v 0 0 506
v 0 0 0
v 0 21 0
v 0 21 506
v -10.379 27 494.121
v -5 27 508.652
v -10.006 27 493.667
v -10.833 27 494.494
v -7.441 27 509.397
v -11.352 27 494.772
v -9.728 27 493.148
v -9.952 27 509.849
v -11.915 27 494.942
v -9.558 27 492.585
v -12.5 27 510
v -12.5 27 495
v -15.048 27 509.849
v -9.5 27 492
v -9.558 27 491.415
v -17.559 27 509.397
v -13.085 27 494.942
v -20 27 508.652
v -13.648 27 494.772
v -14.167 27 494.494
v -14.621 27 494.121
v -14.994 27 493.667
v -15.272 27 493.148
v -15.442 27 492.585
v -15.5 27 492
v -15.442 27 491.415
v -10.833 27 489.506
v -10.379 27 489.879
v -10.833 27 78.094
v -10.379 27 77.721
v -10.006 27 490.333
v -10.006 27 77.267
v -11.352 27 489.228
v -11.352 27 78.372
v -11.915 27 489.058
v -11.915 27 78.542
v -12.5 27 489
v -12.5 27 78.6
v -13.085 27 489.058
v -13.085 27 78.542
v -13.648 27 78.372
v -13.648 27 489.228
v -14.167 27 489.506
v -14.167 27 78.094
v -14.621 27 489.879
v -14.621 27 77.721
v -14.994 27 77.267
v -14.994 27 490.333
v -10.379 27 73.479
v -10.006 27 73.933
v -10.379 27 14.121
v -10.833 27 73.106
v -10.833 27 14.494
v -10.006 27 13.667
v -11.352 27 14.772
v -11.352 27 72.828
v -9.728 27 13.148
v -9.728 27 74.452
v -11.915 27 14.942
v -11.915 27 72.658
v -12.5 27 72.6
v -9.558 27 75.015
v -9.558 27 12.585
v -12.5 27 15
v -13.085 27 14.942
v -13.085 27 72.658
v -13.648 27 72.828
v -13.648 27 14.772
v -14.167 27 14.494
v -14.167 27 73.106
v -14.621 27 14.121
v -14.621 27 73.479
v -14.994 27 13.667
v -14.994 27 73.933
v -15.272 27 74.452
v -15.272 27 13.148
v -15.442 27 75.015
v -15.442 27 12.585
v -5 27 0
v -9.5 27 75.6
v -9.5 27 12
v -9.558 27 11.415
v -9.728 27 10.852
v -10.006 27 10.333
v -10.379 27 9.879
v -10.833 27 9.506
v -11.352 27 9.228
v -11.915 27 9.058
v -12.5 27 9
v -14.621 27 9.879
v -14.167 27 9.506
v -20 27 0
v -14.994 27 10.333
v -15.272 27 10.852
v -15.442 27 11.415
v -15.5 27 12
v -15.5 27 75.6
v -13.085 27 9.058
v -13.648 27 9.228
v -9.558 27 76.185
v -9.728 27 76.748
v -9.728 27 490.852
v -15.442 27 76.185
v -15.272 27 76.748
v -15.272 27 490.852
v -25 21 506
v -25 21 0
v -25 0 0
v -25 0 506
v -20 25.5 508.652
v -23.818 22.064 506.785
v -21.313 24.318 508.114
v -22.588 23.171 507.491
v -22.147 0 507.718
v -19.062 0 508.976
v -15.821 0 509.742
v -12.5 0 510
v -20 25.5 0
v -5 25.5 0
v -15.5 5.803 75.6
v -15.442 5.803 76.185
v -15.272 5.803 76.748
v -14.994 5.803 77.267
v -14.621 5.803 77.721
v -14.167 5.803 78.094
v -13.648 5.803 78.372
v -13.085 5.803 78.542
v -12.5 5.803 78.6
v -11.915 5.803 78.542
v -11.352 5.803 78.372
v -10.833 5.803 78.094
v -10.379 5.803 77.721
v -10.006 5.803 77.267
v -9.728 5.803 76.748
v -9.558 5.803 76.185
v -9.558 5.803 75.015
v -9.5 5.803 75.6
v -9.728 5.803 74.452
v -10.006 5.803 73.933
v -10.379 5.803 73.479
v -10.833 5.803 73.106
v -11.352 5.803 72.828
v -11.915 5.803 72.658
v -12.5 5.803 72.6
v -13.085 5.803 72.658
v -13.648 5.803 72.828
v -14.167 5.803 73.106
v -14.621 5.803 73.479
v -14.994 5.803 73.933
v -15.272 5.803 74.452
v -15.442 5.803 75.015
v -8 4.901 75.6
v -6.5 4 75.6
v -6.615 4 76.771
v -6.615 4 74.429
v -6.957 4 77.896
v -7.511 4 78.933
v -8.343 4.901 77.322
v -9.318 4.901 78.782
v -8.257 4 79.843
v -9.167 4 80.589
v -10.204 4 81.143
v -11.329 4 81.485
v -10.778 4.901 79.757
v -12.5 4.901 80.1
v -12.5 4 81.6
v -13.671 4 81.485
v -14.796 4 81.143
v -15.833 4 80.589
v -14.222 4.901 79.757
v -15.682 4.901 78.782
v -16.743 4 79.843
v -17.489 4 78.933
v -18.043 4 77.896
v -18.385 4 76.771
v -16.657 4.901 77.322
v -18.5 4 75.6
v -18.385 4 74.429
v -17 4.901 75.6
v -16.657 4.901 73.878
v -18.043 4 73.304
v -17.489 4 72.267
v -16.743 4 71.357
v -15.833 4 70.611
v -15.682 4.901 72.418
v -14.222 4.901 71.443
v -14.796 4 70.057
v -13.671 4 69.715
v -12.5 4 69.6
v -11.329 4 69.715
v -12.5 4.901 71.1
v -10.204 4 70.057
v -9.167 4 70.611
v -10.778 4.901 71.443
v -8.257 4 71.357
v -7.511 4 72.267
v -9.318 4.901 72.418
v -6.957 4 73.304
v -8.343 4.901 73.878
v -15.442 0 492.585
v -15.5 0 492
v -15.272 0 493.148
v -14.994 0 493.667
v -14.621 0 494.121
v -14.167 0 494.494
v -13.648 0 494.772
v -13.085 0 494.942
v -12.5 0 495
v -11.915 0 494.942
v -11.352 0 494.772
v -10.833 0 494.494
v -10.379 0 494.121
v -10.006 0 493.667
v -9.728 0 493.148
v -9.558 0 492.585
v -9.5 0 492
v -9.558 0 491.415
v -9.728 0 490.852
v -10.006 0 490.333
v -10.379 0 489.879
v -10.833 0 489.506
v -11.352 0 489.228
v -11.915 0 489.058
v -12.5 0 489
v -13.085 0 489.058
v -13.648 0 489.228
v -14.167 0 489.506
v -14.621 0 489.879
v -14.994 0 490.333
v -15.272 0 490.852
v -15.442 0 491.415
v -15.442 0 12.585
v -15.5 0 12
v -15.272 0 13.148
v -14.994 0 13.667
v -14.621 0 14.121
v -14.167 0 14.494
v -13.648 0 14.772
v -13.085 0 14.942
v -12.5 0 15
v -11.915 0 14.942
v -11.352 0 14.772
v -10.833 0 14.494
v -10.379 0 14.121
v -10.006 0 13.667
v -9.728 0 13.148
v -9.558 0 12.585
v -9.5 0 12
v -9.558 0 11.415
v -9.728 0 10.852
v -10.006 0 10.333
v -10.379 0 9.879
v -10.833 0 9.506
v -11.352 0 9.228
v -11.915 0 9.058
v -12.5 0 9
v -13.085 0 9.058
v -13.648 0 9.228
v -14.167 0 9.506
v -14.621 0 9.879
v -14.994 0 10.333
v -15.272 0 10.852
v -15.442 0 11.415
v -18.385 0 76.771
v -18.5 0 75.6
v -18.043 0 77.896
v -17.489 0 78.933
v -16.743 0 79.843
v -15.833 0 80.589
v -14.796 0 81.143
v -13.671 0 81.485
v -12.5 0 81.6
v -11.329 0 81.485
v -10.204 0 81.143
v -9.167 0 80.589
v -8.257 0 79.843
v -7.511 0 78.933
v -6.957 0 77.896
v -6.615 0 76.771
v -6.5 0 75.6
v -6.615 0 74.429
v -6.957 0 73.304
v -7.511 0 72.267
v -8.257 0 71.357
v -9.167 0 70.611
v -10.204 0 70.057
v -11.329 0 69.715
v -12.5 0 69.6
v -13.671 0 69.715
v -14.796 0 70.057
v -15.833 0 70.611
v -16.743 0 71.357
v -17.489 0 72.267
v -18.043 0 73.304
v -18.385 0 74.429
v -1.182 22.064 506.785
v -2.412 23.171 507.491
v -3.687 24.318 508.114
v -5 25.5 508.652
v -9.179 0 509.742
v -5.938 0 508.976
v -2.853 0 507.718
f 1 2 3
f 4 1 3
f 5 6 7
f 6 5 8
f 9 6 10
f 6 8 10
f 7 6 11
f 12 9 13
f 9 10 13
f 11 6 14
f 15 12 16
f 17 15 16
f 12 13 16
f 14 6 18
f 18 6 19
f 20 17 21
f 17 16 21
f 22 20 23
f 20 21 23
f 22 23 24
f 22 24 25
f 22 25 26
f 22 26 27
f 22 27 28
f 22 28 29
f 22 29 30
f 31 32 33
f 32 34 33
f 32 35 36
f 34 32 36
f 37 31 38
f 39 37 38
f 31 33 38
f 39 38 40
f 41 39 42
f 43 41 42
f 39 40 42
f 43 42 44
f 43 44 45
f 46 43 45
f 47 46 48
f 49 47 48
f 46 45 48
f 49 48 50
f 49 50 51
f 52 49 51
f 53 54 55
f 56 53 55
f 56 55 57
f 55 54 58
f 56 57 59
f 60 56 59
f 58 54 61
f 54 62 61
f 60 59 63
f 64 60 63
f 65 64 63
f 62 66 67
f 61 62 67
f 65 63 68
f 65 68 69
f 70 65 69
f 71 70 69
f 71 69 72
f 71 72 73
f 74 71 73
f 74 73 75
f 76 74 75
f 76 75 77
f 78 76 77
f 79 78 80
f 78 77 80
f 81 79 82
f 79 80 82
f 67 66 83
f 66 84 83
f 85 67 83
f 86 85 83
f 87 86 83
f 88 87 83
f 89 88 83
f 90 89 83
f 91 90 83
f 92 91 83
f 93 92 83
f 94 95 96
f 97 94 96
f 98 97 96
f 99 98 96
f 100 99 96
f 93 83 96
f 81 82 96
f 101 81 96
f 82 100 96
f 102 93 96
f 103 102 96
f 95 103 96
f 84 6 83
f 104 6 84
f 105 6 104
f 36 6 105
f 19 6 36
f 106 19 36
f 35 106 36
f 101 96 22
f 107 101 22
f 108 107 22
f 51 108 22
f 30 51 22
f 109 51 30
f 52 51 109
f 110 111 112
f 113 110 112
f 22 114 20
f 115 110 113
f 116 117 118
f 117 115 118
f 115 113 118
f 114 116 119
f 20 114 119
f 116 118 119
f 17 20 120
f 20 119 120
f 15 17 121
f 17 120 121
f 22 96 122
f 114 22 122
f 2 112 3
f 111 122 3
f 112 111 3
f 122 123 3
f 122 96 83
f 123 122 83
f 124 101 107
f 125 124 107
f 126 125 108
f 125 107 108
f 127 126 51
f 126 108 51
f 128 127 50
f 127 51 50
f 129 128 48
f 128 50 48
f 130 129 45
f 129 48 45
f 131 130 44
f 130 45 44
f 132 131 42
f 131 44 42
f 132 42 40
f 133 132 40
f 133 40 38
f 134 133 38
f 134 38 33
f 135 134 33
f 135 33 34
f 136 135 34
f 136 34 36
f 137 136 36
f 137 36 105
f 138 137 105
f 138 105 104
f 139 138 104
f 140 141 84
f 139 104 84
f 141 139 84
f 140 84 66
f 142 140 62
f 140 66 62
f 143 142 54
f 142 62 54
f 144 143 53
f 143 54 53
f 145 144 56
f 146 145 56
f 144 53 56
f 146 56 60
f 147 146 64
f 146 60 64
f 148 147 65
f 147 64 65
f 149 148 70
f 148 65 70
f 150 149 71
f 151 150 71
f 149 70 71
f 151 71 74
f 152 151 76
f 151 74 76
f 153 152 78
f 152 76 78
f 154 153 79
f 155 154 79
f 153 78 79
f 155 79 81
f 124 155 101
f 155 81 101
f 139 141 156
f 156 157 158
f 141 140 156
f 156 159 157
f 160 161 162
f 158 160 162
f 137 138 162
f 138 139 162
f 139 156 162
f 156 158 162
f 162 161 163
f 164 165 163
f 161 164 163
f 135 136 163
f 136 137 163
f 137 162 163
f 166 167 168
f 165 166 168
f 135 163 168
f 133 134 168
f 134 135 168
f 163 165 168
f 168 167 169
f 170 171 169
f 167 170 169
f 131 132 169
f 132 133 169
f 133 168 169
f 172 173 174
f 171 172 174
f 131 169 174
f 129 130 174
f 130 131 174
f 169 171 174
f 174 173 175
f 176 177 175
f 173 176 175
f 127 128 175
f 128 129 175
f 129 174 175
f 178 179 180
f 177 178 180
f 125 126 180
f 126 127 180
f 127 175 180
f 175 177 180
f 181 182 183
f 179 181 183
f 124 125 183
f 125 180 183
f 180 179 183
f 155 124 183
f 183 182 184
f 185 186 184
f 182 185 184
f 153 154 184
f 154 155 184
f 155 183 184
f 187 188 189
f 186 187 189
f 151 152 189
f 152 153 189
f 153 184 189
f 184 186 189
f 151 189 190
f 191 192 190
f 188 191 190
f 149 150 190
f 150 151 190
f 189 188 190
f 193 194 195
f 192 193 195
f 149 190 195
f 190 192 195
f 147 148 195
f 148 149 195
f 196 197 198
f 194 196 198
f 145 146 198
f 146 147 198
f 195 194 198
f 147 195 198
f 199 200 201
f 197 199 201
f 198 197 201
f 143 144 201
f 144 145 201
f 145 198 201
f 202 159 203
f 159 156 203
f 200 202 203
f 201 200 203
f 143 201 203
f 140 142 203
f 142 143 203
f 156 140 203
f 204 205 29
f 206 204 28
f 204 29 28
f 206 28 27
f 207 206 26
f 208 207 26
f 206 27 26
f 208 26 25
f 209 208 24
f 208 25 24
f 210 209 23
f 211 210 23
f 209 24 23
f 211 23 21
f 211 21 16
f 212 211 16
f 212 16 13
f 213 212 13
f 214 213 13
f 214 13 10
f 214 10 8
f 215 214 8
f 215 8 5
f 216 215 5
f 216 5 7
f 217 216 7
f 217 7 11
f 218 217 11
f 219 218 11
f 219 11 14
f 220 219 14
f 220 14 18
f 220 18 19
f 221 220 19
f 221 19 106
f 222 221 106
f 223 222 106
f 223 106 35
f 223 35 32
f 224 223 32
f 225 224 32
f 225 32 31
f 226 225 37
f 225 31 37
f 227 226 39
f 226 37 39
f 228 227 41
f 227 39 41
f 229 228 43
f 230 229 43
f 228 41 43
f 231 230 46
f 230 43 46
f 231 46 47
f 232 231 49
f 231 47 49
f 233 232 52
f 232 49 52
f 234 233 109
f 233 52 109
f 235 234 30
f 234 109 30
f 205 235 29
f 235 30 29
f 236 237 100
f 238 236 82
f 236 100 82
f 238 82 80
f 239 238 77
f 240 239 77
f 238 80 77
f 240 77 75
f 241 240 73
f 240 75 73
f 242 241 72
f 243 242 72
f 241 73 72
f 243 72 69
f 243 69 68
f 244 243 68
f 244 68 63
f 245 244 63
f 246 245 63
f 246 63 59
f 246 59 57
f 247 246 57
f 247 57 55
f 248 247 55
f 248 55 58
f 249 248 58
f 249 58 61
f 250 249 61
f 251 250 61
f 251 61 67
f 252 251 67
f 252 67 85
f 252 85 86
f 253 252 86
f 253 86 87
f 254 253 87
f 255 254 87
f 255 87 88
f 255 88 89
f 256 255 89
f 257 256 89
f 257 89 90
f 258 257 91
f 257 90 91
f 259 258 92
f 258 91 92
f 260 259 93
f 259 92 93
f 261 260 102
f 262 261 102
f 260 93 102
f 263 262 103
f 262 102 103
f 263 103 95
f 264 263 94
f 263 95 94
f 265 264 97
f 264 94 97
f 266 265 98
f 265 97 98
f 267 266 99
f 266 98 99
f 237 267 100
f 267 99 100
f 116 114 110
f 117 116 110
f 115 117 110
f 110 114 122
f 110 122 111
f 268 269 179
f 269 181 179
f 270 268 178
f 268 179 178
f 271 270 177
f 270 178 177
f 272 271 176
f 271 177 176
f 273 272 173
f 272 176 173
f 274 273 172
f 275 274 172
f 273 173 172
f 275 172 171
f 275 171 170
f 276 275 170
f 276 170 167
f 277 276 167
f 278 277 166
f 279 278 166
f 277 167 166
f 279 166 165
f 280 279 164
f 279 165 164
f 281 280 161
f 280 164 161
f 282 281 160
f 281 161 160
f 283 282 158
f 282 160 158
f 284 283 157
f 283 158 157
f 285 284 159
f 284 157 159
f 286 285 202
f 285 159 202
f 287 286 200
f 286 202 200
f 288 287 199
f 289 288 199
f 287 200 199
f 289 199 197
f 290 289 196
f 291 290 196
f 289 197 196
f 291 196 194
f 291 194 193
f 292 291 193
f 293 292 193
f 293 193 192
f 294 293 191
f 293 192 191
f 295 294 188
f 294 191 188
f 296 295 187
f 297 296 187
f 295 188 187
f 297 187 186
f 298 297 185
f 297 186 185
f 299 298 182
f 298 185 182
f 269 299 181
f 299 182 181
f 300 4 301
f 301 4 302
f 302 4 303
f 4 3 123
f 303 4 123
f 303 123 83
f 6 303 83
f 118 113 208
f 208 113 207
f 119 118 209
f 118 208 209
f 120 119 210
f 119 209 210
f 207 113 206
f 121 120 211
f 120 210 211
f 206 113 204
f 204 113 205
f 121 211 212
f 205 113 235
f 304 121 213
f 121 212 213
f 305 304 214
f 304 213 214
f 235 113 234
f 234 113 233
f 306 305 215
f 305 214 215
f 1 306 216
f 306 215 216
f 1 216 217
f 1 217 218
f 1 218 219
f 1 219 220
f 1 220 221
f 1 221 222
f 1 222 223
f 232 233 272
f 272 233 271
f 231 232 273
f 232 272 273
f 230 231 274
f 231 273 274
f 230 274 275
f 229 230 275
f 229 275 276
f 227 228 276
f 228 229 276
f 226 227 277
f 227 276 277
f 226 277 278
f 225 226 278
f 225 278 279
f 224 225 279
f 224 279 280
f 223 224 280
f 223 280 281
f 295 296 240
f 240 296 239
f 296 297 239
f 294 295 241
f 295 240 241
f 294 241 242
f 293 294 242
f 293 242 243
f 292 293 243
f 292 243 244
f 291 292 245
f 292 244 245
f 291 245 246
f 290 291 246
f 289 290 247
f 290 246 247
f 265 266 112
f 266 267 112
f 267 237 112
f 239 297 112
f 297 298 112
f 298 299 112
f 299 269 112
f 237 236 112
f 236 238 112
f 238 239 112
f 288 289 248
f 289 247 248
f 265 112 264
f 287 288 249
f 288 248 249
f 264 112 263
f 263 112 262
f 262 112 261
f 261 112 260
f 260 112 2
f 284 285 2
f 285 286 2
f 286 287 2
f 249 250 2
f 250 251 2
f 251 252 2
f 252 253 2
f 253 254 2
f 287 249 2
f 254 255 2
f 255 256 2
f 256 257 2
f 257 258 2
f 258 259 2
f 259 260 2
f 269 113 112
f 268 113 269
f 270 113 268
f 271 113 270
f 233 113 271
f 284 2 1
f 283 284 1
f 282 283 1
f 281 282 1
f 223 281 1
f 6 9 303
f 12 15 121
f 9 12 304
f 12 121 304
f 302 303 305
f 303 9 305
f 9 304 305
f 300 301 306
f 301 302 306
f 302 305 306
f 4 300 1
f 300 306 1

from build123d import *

# Parameters (mm, degrees)
F1_DEPTH = 510
F3_DEPTH = 27
F5_D     = 6
F7_D     = 12
F7_DEPTH = 4
F7_TIP   = 3.6051637142


with BuildPart() as f1:
    # F0 (on Top) → F1 (new body)
    with BuildSketch(Plane.XY):
        Polygon((-25, 0), (0, 0), (0, 21), (-5, 25.5), (-5, 27), (-20, 27), (-20, 25.5), (-25, 21), align=None)
    extrude(amount=F1_DEPTH)

    # F2 (on face) → F3 (cut)
    with BuildSketch(Plane.XZ):
        with BuildLine():
            ThreePointArc((-25, 506), (-19.0622023742, 508.9756324194), (-12.5, 510))
            Line((-12.5, 510), (-25, 510))
            Line((-25, 510), (-25, 506))
        make_face()
        with BuildLine():
            Line((0, 510), (-12.5, 510))
            ThreePointArc((-12.5, 510), (-5.9377976258, 508.9756324194), (0, 506))
            Line((0, 506), (0, 510))
        make_face()
    extrude(amount=-F3_DEPTH, mode=Mode.SUBTRACT)

    # F5 (through all)
    with Locations(Plane.XZ):
        with Locations((-12.5, 492), (-12.5, 12), (-12.5, 75.6)):
            Hole(F5_D / 2)

    # F7
    with Locations(Plane.XZ):
        with Locations((-12.5, 75.6)):
            Hole(F7_D / 2, depth=F7_DEPTH)
            with Locations((0, 0, -(F7_DEPTH + F7_TIP / 2))):  # 118° drill point
                Cone(0, F7_D / 2, F7_TIP, mode=Mode.SUBTRACT)


solid = f1.part
